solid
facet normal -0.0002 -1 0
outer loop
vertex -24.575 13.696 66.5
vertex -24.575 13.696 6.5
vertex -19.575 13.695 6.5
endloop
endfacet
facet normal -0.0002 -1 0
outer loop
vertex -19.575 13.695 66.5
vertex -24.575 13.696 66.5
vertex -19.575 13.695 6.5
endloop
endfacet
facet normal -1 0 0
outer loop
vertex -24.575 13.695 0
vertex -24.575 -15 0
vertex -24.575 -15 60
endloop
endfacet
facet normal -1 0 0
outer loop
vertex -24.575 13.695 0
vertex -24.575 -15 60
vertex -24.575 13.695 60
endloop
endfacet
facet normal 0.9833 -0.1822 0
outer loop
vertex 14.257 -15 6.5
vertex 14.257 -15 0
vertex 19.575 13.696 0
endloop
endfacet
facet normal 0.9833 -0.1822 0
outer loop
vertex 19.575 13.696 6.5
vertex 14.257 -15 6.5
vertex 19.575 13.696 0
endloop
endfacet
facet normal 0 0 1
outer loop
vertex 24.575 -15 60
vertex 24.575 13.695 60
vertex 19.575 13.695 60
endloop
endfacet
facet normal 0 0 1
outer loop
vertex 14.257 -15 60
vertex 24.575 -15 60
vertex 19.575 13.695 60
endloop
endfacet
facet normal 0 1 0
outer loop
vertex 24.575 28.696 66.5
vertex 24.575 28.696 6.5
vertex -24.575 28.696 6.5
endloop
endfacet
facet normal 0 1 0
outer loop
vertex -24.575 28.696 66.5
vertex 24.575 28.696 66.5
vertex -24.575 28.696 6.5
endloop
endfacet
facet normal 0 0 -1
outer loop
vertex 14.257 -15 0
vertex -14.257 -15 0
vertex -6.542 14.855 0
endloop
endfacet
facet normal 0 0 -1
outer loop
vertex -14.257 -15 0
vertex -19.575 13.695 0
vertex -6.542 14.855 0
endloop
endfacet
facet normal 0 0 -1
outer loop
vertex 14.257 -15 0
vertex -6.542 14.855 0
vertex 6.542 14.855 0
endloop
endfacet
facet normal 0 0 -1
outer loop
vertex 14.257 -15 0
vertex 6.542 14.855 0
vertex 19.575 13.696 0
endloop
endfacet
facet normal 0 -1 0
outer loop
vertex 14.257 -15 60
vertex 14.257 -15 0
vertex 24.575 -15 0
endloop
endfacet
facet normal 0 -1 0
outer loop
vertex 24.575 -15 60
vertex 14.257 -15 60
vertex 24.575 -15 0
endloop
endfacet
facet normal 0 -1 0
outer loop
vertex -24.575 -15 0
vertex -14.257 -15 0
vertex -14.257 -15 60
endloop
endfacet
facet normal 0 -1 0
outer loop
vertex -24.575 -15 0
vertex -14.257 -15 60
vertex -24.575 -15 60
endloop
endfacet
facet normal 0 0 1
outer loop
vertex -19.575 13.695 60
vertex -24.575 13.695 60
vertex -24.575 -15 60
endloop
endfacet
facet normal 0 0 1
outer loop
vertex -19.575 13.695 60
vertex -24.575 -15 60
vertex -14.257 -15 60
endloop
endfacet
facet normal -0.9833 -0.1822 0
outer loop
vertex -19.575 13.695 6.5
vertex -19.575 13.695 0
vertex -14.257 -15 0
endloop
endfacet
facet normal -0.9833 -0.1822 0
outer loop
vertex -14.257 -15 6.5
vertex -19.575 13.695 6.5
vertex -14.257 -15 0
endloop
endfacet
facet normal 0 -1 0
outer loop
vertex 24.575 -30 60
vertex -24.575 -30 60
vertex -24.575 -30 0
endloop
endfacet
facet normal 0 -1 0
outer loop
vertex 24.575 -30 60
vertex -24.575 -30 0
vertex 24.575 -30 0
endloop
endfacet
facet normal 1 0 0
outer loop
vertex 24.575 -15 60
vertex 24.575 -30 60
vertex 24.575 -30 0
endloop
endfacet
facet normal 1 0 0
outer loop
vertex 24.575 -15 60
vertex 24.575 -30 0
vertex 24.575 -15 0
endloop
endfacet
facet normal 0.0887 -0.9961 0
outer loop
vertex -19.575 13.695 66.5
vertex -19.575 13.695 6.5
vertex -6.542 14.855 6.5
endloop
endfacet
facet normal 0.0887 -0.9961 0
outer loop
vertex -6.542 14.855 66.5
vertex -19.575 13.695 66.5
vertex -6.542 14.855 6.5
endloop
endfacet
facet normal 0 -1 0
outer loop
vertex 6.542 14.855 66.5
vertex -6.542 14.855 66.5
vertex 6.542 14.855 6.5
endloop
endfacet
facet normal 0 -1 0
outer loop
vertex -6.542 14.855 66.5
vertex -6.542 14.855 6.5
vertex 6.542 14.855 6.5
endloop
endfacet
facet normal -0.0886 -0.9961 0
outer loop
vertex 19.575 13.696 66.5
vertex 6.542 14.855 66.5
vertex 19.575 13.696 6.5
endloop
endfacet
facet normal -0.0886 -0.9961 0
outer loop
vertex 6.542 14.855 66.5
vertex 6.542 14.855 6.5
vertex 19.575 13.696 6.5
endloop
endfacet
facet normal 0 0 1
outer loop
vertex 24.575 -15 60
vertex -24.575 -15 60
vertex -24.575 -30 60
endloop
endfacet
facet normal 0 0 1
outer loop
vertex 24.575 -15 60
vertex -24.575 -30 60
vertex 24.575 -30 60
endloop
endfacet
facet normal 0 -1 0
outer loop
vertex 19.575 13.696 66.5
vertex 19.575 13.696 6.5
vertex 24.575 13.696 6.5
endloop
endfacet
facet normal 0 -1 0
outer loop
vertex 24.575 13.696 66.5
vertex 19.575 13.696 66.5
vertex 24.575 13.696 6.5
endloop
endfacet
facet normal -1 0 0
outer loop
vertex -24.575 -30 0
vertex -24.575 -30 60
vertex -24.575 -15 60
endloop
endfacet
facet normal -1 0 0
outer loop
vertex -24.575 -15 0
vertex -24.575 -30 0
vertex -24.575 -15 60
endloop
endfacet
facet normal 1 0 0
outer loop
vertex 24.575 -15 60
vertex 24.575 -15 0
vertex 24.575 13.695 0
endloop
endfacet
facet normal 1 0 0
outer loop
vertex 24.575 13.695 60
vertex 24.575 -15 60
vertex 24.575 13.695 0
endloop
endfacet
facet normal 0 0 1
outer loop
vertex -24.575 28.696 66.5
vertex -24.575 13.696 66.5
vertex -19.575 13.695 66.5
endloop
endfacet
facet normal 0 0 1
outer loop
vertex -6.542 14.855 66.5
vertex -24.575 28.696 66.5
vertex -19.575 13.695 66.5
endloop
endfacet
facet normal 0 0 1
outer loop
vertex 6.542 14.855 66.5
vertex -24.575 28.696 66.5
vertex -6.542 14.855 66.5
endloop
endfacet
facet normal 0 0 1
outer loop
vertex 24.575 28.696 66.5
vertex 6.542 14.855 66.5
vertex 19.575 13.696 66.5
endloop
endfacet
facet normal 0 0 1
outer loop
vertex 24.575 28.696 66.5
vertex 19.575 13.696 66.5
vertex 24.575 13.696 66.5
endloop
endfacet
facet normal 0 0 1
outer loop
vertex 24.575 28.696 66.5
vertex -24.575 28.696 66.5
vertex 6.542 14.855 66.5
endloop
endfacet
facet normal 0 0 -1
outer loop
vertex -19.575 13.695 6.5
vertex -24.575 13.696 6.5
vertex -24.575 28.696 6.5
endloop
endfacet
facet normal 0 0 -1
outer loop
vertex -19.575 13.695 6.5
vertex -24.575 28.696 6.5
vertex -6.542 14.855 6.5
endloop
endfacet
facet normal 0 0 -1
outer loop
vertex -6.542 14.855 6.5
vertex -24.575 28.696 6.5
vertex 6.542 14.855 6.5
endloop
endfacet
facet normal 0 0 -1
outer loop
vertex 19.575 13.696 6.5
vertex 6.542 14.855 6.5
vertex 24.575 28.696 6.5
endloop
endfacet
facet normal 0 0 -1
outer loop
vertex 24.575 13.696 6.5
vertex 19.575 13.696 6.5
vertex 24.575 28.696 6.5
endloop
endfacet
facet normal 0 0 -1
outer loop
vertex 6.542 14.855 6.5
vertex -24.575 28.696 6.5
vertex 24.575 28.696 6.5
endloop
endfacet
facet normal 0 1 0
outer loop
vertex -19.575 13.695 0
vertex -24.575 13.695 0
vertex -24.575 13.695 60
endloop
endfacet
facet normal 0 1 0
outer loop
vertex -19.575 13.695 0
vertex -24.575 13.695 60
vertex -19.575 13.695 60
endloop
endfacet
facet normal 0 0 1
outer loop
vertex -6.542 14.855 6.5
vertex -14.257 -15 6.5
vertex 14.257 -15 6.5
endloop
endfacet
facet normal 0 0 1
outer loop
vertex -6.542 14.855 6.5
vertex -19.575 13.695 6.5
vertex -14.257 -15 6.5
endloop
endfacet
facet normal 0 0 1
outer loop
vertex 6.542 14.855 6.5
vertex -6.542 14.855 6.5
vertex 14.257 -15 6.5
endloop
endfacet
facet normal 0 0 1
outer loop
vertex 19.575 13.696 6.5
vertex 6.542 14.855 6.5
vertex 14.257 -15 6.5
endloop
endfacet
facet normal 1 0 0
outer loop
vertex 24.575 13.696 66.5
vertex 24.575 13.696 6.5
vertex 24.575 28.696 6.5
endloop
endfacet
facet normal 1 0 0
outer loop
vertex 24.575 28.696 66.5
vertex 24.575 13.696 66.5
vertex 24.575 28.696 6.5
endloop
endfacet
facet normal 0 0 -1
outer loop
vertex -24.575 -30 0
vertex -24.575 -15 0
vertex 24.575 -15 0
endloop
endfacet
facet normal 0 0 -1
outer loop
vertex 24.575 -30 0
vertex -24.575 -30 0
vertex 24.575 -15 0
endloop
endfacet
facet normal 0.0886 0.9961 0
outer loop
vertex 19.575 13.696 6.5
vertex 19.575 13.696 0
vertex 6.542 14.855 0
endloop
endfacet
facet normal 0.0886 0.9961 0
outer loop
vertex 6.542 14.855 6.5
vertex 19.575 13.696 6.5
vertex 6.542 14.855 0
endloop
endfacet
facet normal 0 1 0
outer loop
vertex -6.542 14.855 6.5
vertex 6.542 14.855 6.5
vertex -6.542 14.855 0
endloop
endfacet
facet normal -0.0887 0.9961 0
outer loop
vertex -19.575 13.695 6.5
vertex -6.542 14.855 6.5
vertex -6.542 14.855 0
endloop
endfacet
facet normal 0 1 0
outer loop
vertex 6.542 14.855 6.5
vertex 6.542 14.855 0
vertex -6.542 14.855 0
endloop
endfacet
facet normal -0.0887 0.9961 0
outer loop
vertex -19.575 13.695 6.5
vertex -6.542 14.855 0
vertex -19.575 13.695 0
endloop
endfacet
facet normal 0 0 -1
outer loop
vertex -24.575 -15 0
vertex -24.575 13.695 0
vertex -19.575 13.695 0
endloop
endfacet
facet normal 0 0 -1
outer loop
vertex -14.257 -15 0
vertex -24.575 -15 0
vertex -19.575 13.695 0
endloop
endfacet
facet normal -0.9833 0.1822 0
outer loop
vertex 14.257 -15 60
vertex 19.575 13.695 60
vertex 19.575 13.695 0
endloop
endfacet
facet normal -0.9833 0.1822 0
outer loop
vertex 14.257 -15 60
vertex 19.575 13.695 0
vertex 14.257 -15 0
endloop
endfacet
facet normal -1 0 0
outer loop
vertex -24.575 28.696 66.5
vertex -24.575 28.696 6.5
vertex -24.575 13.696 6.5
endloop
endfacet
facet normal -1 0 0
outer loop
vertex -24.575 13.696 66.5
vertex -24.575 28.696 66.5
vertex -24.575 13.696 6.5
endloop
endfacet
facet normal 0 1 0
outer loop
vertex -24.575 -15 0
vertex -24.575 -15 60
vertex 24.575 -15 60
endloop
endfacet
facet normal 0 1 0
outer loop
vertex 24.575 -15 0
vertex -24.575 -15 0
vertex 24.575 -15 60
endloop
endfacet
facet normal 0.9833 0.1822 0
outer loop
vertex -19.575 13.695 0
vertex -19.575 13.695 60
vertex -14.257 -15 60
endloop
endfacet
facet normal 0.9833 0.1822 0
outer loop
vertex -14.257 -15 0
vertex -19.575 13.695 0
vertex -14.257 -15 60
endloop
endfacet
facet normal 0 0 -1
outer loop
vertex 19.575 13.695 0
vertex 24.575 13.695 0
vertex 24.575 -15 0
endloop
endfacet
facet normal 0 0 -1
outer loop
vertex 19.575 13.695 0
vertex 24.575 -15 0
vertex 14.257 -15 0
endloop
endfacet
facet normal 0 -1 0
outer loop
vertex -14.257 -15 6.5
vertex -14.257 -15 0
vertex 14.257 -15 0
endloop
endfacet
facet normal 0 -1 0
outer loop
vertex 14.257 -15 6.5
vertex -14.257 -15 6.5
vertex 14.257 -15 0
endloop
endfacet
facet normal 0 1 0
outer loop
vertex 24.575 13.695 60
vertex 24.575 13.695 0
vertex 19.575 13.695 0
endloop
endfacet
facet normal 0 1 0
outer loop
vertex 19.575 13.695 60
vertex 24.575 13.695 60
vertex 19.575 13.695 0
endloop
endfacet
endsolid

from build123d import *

# Parameters (mm, degrees)
F1_DEPTH = 6.5
F3_DEPTH = 60
F6_DEPTH = 60
F7_W     = 49.15
F7_H     = 15
F8_DEPTH = 60


with BuildPart() as f1:
    # F0 (on Top) → F1 (new body)
    with BuildSketch(Plane.XY):
        with BuildLine():
            Line((-14.2567, -15), (14.256576, -15))
            Line((14.256576, -15), (19.575, 13.6955))
            ThreePointArc((19.575, 13.6955), (-1.3e-05, 15), (-19.575, 13.695125))
            Line((-19.575, 13.695125), (-14.2567, -15))
        make_face()
    extrude(amount=F1_DEPTH)


with BuildPart() as f3:
    # F2 (on face) → F3 (new body)
    with BuildSketch(Plane(origin=(0, 0, 0), x_dir=(1, 0, 0), z_dir=(0, 0, -1))):
        Polygon((-14.2567, 15), (-19.575, 15), (-24.575, 15), (-24.575, -13.695125), (-19.575, -13.695125), align=None)
    extrude(amount=-F3_DEPTH)


with BuildPart() as f4_1:
    # F4: instance of F3
    add(f3.part.mirror(Plane.YZ))


with BuildPart() as f6:
    # F5 (on face) → F6 (new body)
    with BuildSketch(Plane.XY.offset(6.5)):
        with BuildLine():
            ThreePointArc((-19.575, 13.695125), (-1.3e-05, 15), (19.575, 13.6955))
            Line((19.575, 13.6955), (24.575, 13.6955))
            Line((24.575, 13.6955), (24.575, 28.6955))
            Line((24.575, 28.6955), (-24.575, 28.6955))
            Line((-24.575, 28.6955), (-24.575, 13.6955))
            Line((-24.575, 13.6955), (-19.575, 13.695125))
        make_face()
    extrude(amount=F6_DEPTH)


with BuildPart() as f8:
    # F7 (on face) → F8 (new body)
    with BuildSketch(Plane.XY.offset(60)):
        with Locations((0, -22.5)):
            Rectangle(F7_W, F7_H)
    extrude(amount=-F8_DEPTH)


solid = Compound([f1.part, f3.part, f4_1.part, f6.part, f8.part])
